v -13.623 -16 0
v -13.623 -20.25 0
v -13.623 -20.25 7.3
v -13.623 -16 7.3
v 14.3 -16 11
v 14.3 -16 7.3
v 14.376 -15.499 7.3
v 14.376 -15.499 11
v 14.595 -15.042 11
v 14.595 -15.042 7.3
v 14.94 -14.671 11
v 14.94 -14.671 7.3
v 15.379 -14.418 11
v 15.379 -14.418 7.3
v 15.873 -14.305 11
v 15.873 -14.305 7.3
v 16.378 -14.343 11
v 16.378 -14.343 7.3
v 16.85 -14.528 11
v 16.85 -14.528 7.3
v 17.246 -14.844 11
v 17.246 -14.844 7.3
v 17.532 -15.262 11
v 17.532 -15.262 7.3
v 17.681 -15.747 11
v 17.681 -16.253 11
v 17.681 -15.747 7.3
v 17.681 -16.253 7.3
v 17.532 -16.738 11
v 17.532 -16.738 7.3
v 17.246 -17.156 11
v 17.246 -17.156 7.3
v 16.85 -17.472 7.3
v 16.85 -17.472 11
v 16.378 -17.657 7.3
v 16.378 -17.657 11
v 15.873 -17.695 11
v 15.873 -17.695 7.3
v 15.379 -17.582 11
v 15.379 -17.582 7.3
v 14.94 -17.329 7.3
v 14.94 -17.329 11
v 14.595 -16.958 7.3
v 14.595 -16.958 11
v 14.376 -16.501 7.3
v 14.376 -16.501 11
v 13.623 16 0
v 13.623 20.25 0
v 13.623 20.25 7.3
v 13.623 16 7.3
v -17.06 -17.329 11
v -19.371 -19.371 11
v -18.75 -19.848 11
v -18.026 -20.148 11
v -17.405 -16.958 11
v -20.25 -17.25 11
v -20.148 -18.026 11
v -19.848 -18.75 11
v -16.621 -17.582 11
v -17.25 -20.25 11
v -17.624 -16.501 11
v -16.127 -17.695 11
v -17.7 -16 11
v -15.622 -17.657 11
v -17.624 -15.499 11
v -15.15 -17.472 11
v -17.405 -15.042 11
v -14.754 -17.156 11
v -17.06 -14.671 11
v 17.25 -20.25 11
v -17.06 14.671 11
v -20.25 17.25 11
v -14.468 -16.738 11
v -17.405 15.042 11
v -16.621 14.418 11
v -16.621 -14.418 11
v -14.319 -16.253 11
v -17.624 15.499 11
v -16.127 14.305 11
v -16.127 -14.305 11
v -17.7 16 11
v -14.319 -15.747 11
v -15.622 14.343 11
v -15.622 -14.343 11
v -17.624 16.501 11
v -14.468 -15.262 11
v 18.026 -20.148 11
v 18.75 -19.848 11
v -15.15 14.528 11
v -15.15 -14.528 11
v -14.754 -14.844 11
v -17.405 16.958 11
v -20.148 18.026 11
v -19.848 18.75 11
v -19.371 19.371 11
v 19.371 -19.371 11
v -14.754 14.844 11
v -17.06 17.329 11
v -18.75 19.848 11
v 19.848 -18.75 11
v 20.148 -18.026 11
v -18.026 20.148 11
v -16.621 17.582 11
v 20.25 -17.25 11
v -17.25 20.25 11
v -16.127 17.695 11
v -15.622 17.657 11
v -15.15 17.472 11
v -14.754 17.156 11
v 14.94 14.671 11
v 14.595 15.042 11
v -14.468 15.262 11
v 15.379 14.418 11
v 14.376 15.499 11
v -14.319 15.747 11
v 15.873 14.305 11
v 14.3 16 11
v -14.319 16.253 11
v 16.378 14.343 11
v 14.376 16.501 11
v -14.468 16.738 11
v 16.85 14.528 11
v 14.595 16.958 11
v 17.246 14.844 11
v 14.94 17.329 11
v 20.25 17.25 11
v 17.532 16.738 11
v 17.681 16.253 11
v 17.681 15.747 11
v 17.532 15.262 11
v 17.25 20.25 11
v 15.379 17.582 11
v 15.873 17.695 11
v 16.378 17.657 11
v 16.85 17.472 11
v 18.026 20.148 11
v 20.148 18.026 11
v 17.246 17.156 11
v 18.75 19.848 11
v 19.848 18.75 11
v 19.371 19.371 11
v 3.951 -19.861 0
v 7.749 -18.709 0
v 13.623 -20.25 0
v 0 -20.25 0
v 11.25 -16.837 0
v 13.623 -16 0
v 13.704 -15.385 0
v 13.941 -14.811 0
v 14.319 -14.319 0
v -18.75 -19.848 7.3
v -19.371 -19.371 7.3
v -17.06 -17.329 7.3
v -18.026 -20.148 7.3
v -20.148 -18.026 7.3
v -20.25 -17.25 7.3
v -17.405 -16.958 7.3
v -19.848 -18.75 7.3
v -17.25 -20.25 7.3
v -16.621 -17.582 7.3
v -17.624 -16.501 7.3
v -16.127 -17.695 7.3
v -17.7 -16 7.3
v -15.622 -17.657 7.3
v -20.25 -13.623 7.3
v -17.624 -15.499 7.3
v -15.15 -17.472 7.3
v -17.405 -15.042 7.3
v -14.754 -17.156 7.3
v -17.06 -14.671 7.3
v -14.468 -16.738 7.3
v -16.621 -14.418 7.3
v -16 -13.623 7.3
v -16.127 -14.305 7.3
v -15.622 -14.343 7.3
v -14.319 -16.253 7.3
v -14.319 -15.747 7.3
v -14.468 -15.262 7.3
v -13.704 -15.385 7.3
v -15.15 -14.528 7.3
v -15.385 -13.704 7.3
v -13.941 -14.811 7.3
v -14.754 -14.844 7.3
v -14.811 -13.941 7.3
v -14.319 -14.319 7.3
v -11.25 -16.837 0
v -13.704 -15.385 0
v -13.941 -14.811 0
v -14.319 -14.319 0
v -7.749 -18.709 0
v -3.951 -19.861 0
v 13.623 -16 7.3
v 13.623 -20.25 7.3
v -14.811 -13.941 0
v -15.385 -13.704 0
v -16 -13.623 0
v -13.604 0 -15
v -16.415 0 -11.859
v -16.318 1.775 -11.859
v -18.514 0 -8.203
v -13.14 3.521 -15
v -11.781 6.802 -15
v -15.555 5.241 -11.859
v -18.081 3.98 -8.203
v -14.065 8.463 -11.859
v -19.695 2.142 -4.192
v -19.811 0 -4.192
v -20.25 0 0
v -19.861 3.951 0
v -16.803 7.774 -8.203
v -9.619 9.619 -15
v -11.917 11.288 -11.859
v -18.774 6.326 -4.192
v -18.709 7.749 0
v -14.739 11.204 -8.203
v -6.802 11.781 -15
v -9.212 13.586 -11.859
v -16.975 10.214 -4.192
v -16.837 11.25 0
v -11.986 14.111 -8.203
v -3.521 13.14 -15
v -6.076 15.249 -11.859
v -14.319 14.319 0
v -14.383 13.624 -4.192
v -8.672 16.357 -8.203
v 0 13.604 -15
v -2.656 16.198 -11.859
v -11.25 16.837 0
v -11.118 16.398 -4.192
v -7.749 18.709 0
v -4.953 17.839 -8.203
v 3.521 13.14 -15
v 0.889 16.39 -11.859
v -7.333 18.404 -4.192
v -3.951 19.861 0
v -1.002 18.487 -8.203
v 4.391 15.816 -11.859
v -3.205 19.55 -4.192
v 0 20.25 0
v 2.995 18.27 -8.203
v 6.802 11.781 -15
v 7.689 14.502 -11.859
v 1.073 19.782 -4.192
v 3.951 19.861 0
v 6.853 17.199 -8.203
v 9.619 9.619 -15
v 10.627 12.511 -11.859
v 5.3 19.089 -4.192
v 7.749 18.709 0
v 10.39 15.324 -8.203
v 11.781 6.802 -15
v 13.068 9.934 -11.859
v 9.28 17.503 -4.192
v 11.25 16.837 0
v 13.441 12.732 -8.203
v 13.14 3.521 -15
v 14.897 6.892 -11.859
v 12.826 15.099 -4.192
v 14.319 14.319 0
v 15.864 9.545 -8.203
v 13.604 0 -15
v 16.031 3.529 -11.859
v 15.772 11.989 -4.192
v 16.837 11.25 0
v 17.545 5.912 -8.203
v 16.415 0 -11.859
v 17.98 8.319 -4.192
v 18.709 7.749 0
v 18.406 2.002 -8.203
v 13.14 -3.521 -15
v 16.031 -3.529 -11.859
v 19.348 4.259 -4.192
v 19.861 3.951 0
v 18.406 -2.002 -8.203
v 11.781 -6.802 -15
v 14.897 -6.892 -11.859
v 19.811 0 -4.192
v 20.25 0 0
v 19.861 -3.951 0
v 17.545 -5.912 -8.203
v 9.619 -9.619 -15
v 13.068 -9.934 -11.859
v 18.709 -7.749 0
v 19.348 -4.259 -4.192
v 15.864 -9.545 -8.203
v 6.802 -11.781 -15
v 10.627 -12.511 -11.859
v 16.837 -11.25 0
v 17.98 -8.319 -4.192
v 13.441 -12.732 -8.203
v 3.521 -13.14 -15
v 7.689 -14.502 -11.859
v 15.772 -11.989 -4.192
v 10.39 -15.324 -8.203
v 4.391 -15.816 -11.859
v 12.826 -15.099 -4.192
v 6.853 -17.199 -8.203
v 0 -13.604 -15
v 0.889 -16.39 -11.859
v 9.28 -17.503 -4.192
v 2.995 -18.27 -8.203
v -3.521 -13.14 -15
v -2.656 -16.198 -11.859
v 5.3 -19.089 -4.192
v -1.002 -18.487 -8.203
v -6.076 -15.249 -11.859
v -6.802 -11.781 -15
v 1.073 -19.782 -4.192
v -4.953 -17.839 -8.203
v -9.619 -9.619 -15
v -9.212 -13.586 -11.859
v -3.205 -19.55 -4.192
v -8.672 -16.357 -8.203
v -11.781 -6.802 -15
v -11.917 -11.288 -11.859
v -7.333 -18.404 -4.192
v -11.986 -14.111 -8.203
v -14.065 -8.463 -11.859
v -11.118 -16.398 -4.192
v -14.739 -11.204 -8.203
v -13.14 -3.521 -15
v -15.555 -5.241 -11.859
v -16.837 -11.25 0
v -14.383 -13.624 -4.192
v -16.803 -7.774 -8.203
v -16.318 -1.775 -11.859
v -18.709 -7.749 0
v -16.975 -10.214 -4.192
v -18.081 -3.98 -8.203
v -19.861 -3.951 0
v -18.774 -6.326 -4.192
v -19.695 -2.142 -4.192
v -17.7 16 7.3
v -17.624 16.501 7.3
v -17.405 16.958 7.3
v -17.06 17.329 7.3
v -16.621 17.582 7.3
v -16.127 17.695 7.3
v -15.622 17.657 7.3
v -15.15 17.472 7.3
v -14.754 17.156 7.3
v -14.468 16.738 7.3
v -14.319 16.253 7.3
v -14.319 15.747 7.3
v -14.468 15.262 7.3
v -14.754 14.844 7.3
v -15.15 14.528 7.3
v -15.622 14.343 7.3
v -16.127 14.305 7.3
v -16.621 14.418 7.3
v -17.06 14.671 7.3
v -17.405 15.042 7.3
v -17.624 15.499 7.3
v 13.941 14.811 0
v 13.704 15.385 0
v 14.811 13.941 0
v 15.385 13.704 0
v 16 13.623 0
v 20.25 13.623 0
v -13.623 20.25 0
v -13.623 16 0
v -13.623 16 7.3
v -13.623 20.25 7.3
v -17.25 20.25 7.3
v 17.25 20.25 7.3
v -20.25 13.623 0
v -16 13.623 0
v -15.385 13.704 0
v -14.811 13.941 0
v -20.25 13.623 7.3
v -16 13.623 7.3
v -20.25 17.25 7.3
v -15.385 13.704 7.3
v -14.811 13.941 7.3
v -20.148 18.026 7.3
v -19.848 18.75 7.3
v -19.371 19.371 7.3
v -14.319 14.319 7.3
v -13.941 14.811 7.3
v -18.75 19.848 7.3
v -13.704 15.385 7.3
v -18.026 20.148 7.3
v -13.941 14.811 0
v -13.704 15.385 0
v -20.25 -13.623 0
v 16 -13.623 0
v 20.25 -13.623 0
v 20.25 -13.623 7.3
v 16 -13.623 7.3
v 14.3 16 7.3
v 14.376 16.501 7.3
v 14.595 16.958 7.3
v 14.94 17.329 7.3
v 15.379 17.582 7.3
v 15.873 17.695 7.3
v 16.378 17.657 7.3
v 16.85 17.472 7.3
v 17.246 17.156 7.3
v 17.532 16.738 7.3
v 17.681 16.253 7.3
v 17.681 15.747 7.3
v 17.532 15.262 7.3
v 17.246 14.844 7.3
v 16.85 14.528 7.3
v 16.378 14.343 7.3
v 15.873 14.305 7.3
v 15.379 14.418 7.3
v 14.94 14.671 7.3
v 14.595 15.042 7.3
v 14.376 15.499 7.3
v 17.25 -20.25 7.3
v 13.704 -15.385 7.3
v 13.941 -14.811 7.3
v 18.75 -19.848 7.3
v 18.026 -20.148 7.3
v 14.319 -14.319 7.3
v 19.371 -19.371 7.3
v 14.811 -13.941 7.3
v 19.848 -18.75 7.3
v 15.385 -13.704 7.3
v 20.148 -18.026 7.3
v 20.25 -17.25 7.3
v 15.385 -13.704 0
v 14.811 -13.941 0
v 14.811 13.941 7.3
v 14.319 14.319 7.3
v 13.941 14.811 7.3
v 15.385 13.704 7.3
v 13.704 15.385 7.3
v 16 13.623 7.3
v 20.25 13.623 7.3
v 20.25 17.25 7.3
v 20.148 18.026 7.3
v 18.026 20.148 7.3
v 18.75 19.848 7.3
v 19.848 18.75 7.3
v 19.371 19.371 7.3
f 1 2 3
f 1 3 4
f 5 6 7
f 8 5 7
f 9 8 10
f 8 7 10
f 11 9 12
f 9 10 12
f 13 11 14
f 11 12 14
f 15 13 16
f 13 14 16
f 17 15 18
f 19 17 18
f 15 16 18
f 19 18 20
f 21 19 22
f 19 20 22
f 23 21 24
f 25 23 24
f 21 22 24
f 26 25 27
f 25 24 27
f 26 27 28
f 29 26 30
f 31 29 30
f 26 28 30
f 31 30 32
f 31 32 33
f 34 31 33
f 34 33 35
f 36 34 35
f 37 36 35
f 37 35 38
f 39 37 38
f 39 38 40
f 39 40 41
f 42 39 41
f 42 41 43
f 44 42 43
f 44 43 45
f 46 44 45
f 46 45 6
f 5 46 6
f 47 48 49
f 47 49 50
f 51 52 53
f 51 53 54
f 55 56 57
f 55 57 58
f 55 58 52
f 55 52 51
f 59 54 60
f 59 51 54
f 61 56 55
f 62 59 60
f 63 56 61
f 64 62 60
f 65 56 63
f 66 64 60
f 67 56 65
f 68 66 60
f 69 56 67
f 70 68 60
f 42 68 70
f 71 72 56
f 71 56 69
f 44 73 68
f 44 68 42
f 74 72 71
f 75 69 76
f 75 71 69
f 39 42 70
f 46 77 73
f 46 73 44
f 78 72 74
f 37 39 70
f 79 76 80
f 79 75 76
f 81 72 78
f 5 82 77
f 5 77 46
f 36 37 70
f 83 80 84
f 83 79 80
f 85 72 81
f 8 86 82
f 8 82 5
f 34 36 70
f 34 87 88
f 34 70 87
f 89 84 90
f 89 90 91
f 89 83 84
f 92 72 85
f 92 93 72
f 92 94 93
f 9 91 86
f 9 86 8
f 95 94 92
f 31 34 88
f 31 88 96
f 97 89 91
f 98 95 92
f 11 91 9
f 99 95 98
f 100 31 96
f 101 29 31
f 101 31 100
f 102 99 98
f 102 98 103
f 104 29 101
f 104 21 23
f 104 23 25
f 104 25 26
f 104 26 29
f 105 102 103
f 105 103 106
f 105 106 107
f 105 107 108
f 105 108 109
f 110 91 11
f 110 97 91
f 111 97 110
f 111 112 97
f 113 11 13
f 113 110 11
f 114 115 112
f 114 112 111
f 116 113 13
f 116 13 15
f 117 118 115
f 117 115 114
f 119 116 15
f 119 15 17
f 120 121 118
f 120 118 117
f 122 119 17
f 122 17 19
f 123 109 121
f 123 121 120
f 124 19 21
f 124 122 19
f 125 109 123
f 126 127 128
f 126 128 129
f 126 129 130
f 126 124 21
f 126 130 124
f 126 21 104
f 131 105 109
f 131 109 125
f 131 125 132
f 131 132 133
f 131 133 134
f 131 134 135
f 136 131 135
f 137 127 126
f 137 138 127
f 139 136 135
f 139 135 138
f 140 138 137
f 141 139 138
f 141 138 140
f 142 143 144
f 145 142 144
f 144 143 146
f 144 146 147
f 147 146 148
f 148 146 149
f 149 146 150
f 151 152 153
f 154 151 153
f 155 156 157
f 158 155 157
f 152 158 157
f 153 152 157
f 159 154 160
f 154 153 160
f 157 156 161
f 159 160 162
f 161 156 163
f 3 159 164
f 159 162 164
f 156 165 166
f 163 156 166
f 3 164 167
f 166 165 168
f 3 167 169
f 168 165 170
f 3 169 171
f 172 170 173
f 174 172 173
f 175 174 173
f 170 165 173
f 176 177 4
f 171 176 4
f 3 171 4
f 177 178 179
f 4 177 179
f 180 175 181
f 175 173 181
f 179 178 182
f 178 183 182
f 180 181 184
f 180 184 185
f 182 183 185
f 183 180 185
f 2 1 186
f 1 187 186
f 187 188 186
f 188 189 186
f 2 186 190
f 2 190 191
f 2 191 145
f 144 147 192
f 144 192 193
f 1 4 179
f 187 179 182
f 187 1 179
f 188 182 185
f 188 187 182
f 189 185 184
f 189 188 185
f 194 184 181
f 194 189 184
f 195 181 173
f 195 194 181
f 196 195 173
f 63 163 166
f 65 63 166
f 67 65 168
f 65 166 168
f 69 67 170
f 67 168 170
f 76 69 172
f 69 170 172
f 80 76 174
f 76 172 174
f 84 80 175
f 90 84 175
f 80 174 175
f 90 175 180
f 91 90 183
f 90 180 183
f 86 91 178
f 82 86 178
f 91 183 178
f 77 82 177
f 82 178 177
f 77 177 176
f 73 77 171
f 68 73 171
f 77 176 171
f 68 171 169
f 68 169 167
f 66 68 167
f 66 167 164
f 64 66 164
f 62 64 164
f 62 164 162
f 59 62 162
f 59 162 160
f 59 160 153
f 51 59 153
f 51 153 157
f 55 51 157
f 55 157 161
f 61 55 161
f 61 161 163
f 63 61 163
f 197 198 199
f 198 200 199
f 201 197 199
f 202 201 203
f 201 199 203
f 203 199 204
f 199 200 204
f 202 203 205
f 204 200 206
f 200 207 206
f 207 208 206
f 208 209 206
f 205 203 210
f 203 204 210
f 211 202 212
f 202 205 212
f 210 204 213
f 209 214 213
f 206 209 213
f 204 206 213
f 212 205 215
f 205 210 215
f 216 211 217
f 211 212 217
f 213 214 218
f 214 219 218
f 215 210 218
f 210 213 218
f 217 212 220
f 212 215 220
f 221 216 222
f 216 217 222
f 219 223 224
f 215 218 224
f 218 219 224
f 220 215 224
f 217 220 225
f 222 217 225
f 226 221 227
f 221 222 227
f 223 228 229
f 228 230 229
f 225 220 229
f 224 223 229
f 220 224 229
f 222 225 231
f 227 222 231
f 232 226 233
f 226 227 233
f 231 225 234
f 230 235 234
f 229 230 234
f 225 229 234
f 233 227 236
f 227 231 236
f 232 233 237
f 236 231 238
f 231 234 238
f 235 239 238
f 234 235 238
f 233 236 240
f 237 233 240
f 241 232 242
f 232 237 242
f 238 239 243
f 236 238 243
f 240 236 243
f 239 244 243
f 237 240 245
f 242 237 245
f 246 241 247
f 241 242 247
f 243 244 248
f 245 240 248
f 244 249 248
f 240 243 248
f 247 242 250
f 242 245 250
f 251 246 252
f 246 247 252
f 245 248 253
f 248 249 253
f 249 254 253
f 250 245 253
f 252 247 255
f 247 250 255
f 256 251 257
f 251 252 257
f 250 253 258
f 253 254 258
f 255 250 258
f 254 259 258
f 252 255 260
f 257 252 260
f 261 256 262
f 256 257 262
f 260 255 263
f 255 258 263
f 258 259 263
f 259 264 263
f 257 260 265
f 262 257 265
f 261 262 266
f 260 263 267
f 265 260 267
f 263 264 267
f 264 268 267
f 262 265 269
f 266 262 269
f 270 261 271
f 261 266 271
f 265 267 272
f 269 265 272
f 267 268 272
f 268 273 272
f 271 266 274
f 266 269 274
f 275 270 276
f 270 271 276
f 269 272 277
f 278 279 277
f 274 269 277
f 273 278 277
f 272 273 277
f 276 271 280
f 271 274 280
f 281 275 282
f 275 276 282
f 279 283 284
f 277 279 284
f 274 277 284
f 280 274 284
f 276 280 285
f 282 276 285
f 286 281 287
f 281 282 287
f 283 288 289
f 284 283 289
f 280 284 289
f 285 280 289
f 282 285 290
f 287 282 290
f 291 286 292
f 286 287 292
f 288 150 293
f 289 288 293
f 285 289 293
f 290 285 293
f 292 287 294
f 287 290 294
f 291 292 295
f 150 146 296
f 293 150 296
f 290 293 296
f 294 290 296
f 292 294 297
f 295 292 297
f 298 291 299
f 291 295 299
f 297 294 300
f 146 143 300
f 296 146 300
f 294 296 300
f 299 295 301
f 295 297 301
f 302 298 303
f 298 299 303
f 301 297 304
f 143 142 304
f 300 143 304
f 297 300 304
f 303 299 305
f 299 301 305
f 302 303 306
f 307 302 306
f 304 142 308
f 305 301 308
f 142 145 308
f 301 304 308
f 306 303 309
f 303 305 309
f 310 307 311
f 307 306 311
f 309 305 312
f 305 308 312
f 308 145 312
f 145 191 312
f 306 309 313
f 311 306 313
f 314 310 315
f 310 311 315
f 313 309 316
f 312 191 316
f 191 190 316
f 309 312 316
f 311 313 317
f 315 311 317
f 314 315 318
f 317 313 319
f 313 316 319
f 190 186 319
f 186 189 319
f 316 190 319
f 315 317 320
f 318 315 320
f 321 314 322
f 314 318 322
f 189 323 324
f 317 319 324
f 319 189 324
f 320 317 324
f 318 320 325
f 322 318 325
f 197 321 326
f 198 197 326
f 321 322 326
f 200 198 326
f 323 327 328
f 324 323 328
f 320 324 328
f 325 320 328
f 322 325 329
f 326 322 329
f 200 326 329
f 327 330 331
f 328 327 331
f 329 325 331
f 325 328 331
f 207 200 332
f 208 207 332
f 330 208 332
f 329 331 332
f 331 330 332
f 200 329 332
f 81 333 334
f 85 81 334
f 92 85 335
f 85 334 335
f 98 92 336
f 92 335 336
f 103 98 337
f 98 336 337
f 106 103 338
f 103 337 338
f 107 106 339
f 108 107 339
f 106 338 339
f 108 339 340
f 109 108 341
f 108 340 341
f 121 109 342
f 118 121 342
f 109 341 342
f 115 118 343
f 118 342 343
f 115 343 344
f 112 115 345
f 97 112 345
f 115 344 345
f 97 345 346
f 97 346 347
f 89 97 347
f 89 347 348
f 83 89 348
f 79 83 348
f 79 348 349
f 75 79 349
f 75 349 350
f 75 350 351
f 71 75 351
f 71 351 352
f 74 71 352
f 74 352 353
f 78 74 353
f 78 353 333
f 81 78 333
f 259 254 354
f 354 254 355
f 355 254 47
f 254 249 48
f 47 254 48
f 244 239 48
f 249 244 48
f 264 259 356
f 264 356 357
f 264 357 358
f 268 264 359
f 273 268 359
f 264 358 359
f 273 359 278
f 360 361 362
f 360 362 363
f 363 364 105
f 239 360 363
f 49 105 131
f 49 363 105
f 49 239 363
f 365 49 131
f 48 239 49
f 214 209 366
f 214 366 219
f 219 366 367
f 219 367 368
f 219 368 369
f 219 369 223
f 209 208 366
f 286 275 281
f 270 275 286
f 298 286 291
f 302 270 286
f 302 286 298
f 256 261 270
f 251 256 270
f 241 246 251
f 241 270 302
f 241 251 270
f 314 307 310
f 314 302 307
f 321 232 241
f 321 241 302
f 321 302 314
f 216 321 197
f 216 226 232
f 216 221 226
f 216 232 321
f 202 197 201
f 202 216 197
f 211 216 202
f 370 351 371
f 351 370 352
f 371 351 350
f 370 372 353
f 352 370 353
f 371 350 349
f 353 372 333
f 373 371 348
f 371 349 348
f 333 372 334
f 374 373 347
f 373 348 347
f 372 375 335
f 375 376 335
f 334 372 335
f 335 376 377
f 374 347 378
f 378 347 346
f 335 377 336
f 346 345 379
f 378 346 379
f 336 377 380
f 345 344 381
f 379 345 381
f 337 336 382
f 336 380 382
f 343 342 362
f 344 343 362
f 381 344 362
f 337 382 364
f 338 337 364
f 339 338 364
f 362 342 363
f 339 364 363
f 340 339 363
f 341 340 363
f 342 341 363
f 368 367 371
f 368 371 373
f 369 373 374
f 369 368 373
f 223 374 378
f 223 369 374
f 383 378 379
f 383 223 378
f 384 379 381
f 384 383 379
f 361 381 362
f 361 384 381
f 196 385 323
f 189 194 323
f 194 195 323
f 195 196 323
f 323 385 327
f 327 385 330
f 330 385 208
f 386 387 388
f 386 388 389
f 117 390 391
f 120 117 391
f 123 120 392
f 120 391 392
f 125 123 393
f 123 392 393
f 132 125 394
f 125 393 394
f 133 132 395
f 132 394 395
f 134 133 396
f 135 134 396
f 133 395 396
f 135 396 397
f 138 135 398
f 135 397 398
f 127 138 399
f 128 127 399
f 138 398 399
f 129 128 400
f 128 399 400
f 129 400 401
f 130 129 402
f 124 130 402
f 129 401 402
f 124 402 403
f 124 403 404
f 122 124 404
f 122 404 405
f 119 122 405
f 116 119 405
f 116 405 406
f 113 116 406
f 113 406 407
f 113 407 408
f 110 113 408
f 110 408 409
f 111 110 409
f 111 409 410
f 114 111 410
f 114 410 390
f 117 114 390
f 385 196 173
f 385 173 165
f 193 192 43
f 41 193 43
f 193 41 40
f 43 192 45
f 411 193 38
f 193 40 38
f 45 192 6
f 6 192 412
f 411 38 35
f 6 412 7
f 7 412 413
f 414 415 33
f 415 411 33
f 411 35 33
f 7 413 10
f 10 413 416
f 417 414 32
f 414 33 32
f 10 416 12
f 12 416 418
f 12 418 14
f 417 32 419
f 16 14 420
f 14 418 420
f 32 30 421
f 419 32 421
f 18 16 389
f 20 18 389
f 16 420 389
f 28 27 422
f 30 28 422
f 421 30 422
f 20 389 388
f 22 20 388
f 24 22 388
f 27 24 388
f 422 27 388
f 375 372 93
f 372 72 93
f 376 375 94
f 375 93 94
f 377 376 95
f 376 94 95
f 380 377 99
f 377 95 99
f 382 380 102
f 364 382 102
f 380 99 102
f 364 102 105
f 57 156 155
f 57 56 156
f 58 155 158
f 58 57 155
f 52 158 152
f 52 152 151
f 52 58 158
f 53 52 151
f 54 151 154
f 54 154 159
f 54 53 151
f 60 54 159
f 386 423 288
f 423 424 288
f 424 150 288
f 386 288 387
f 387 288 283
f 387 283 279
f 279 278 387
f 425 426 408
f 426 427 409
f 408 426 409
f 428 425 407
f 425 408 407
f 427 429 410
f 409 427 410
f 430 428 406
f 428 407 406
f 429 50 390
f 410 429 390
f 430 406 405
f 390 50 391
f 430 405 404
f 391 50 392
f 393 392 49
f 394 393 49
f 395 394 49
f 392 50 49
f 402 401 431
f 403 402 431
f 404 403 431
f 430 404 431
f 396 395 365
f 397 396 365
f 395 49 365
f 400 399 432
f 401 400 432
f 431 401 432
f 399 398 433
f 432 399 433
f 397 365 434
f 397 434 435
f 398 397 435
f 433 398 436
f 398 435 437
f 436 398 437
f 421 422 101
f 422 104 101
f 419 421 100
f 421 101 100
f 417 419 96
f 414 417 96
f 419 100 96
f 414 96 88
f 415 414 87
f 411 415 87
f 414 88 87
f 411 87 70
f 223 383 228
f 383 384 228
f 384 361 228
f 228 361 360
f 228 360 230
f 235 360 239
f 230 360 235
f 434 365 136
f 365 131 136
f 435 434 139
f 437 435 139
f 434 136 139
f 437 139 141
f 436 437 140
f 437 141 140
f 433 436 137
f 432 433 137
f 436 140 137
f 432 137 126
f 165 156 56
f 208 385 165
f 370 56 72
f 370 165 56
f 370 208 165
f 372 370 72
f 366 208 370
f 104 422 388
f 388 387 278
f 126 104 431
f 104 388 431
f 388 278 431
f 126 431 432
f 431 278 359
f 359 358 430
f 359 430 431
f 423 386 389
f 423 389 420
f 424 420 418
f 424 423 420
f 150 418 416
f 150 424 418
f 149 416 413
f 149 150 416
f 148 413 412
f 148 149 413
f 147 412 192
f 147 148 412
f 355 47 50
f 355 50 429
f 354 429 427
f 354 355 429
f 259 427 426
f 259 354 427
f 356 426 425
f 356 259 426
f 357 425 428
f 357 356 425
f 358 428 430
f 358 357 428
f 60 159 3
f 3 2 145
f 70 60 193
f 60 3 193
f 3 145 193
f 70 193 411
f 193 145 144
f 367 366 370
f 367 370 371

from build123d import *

# Parameters (mm, degrees)
SKETCH_1_W          = 40.5
SKETCH_1_H          = 40.5
EXTRUDE_1_DEPTH     = 11
HOLE_WIZARD_M31_D   = 3.4
SKETCH_7_W          = 40.5
SKETCH_7_H          = 40.5
CUT_EXTRUDE_1_DEPTH = 11
CUT_EXTRUDE_2_DEPTH = 7.3
FILLET_1_R          = 3


with BuildPart() as part:
    # Эскиз1 → Бобышка-Вытянуть1 (new body)
    with BuildSketch(Plane.XY):
        Rectangle(SKETCH_1_W, SKETCH_1_H)
    extrude(amount=EXTRUDE_1_DEPTH)

    # Отверстие с зазором M31 (through all)
    with Locations(Plane.XY.offset(11)):
        with Locations((-16, 16), (16, 16), (16, -16), (-16, -16)):
            Hole(HOLE_WIZARD_M31_D / 2)

    # Эскиз6 → Повернуть1 (revolve)
    with BuildSketch(Plane(origin=(0, 0, 0), x_dir=(-1, 0, 0), z_dir=(0, -1, 0))):
        with BuildLine():
            Line((20.25, 0), (0, 0))
            Line((0, 0), (0, 20.25))
            ThreePointArc((0, 20.25), (14.318912319, 14.318912319), (20.25, 0))
        make_face()
    revolve(axis=Axis((0, 0, 0), (0, 0, -1)))

    # Эскиз7 → Вырез-Вытянуть1 (cut)
    with BuildSketch(Plane(origin=(0, 0, -15), x_dir=(-1, 0, 0), z_dir=(0, 0, -1))):
        Rectangle(SKETCH_7_W, SKETCH_7_H)
    extrude(amount=CUT_EXTRUDE_1_DEPTH, mode=Mode.SUBTRACT)

    # Эскиз9 → Вырез-Вытянуть2 (cut)
    with BuildSketch(Plane(origin=(0, 0, 0), x_dir=(-1, 0, 0), z_dir=(0, 0, -1))):
        with BuildLine():
            Line((-20.25, 20.25), (-13.622583002, 20.25))
            Line((-13.622583002, 20.25), (-13.622583002, 16))
            ThreePointArc((-13.622583002, 16), (-14.318912319, 14.318912319), (-16, 13.622583002))
            Line((-16, 13.622583002), (-20.25, 13.622583002))
            Line((-20.25, 13.622583002), (-20.25, 20.25))
        make_face()
        with BuildLine():
            Line((20.25, 20.25), (20.25, 13.622583002))
            Line((20.25, 13.622583002), (16, 13.622583002))
            ThreePointArc((16, 13.622583002), (14.318912319, 14.318912319), (13.622583002, 16))
            Line((13.622583002, 16), (13.622583002, 20.25))
            Line((13.622583002, 20.25), (20.25, 20.25))
        make_face()
        with BuildLine():
            Line((20.25, -20.25), (13.622583002, -20.25))
            Line((13.622583002, -20.25), (13.622583002, -16))
            ThreePointArc((13.622583002, -16), (14.318912319, -14.318912319), (16, -13.622583002))
            Line((16, -13.622583002), (20.25, -13.622583002))
            Line((20.25, -13.622583002), (20.25, -20.25))
        make_face()
        with BuildLine():
            Line((-20.25, -20.25), (-20.25, -13.622583002))
            Line((-20.25, -13.622583002), (-16, -13.622583002))
            ThreePointArc((-16, -13.622583002), (-14.318912319, -14.318912319), (-13.622583002, -16))
            Line((-13.622583002, -16), (-13.622583002, -20.25))
            Line((-13.622583002, -20.25), (-20.25, -20.25))
        make_face()
    extrude(amount=-CUT_EXTRUDE_2_DEPTH, mode=Mode.SUBTRACT)

    # Скругление1
    fillet_1_edges = [part.edges().sort_by_distance(p)[0] for p in [
        (20.25, -20.25, 9.15),
        (-20.25, -20.25, 9.15),
        (-20.25, 20.25, 9.15),
        (20.25, 20.25, 9.15),
    ]]
    fillet(fillet_1_edges, radius=FILLET_1_R)


solid = part.part
